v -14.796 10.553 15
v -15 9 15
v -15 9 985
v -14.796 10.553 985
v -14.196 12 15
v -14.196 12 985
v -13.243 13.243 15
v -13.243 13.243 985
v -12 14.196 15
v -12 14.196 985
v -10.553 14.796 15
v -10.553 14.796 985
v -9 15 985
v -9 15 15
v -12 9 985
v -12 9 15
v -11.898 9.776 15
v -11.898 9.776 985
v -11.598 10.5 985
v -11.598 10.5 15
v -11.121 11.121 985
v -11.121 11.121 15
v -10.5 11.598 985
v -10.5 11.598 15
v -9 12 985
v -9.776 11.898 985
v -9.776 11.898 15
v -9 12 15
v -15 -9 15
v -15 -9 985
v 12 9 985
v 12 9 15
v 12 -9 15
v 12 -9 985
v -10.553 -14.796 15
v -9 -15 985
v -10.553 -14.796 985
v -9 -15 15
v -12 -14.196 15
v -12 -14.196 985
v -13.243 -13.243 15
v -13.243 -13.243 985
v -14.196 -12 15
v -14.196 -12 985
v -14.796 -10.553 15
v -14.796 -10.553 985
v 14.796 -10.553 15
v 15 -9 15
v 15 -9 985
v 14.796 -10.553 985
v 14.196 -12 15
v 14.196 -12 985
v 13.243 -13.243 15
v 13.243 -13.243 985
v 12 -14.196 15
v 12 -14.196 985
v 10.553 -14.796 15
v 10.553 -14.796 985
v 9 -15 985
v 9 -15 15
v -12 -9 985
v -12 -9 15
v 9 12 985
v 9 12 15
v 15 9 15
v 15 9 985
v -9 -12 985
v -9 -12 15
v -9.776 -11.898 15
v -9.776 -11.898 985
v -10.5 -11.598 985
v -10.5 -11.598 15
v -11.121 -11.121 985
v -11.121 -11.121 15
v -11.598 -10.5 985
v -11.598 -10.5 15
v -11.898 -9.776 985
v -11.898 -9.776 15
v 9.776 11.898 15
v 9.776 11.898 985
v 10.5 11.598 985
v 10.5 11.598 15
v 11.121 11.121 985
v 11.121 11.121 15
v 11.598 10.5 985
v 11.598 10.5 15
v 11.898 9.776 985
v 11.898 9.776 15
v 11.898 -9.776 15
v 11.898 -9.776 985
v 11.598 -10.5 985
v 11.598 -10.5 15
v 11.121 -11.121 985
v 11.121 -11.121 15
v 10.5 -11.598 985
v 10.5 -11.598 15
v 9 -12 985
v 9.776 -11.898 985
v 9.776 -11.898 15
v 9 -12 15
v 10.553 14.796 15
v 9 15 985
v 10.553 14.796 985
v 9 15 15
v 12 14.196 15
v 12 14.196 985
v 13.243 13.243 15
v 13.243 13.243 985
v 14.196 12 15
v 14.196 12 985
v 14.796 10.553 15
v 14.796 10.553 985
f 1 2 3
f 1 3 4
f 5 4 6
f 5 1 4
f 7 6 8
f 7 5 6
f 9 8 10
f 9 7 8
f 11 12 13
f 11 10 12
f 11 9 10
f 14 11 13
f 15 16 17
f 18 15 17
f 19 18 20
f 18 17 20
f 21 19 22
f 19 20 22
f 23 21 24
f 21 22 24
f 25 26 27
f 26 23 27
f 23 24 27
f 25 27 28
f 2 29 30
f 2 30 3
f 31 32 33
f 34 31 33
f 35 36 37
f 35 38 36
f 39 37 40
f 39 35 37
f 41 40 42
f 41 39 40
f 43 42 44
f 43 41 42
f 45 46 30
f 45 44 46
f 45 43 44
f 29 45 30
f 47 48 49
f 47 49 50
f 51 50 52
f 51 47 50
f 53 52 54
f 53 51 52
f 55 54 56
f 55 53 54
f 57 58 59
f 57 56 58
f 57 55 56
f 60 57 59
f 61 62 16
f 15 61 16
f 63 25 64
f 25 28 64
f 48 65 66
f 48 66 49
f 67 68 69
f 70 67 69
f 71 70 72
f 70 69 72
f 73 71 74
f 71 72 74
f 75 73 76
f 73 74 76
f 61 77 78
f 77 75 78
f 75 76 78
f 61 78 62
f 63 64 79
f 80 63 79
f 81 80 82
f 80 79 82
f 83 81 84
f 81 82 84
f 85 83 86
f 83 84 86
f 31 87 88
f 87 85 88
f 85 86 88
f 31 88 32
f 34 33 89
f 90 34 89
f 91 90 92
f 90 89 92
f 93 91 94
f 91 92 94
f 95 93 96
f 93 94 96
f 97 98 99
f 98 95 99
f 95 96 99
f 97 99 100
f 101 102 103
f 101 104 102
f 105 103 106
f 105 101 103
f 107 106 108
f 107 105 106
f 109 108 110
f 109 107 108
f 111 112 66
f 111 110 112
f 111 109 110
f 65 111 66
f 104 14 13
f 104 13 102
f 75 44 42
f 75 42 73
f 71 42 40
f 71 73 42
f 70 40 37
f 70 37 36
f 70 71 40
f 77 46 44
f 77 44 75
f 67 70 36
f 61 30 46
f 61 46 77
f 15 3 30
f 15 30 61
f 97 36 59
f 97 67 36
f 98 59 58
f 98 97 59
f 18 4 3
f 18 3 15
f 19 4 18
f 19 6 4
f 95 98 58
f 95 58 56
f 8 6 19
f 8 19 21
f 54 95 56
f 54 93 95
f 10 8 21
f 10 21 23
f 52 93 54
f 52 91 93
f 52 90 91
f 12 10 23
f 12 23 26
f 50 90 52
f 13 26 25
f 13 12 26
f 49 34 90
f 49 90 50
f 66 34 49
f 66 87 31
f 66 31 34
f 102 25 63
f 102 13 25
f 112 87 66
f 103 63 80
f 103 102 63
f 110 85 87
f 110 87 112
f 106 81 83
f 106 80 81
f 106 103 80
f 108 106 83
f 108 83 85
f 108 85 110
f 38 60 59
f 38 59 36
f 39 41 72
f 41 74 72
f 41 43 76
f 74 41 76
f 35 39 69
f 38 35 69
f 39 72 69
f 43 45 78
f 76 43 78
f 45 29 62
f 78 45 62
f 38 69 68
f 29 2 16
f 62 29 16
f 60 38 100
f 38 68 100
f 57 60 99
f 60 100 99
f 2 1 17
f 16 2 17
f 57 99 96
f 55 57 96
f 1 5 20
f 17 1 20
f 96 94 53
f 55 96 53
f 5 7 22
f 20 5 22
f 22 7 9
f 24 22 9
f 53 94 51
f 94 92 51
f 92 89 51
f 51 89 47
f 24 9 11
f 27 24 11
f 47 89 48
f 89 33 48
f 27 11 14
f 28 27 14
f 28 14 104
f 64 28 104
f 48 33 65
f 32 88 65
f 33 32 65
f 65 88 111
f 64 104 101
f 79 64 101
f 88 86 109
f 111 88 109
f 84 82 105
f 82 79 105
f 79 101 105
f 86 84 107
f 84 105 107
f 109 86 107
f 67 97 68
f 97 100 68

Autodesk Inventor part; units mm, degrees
ref_plane "Start Plane" through (0, 0, 15) normal (0, 0, 1) x (1, 0, 0)
ref_plane "End Plane" through (0, 0, 985) normal (0, 0, 1) x (1, 0, 0)
sketch "Sketch" plane through (0, 0, 0) normal (0, 0, 1) x (1, 0, 0)
  line L0 (-15, -9) -> (-15, 9)
  line L1 (-9, 15) -> (9, 15)
  line L2 (15, 9) -> (15, -9)
  line L3 (9, -15) -> (-9, -15)
  arc A0 (-15, -9) -> (-9, -15) centre (-9, -9) ccw
  arc A1 (-9, 15) -> (-15, 9) centre (-9, 9) ccw
  arc A2 (15, 9) -> (9, 15) centre (9, 9) ccw
  arc A3 (9, -15) -> (15, -9) centre (9, -9) ccw
  arc A4 (-9, 12) -> (-12, 9) centre (-9, 9) ccw
  line L4 (-9, 12) -> (9, 12)
  arc A5 (12, 9) -> (9, 12) centre (9, 9) ccw
  line L5 (12, 9) -> (12, -9)
  arc A6 (9, -12) -> (12, -9) centre (9, -9) ccw
  line L6 (9, -12) -> (-9, -12)
  arc A7 (-12, -9) -> (-9, -12) centre (-9, -9) ccw
  line L7 (-12, -9) -> (-12, 9)
  line L8 (0, 22.7397) -> (0, -22.7397) construction
  line L9 (-22.7397, 0) -> (22.7397, 0) construction
  dimension "d7" = 6
  dimension "d10" = 30
  dimension "d11" = 30
  dimension "d12" = 3
  dimension "d15" = 15
  dimension "d16" = 15
extrude "Body" add sketch "Sketch" along normal up to surface (970 mm away) from surface at 15
sketch "Sketch3" plane through (0, 0, 0) normal (0, 0, 1) x (1, 0, 0)
  line L0 (0, 0) -> (10, 0)
ref_plane "Work Plane3" through (0, 0, 0) normal (0, -1, 0) x (1, 0, 0)
ref_plane "Work Plane4" through (-9, -2487, 15) normal (0, 0, -1) x (-1, 0, 0)
split "Split1" plane through (-9, -2487, 15) removes the side toward (0, 0, -1)
ref_plane "Work Plane5" through (9, -2487, 985) normal (0, 0, 1) x (1, 0, 0)
split "Split2" plane through (9, -2487, 985) removes the side toward (0, 0, 1)
sketch "Sketch4" plane through (0, 0, 0) normal (0, -1, 0) x (1, 0, 0)
  line L0 (-2, 15) -> (12, 15) projected
  line L1 (-2, 985) -> (12, 985) projected
  dimension "d18" = 970
equation "\"d7\" = G_IR"
equation "\"d10\" = G_H"
equation "\"d11\" = G_W"
equation "\"d12\" = G_T"
equation "\"d15\" = 0.5 * d10"
equation "\"d16\" = 0.5 * d11"
equation "\"d3\" = G_L"
equation "\"G_W\" = 30"
equation "\"G_H\" = 30"
equation "\"G_T\" = 3"
equation "\"G_IR\" = 6"
equation "\"G_L\" = d18"
equation "\"G_OFFSET_START\" = -15"
equation "\"G_OFFSET_END\" = -15"
equation "\"d13\" = -G_OFFSET_START"
equation "\"d14\" = G_OFFSET_END + B_L"
equation "\"B_L\" = 1000"
properties part number "DIN EN 10219-2 - 30 x 30 x 3  - 970" material "Steel, Mild"
